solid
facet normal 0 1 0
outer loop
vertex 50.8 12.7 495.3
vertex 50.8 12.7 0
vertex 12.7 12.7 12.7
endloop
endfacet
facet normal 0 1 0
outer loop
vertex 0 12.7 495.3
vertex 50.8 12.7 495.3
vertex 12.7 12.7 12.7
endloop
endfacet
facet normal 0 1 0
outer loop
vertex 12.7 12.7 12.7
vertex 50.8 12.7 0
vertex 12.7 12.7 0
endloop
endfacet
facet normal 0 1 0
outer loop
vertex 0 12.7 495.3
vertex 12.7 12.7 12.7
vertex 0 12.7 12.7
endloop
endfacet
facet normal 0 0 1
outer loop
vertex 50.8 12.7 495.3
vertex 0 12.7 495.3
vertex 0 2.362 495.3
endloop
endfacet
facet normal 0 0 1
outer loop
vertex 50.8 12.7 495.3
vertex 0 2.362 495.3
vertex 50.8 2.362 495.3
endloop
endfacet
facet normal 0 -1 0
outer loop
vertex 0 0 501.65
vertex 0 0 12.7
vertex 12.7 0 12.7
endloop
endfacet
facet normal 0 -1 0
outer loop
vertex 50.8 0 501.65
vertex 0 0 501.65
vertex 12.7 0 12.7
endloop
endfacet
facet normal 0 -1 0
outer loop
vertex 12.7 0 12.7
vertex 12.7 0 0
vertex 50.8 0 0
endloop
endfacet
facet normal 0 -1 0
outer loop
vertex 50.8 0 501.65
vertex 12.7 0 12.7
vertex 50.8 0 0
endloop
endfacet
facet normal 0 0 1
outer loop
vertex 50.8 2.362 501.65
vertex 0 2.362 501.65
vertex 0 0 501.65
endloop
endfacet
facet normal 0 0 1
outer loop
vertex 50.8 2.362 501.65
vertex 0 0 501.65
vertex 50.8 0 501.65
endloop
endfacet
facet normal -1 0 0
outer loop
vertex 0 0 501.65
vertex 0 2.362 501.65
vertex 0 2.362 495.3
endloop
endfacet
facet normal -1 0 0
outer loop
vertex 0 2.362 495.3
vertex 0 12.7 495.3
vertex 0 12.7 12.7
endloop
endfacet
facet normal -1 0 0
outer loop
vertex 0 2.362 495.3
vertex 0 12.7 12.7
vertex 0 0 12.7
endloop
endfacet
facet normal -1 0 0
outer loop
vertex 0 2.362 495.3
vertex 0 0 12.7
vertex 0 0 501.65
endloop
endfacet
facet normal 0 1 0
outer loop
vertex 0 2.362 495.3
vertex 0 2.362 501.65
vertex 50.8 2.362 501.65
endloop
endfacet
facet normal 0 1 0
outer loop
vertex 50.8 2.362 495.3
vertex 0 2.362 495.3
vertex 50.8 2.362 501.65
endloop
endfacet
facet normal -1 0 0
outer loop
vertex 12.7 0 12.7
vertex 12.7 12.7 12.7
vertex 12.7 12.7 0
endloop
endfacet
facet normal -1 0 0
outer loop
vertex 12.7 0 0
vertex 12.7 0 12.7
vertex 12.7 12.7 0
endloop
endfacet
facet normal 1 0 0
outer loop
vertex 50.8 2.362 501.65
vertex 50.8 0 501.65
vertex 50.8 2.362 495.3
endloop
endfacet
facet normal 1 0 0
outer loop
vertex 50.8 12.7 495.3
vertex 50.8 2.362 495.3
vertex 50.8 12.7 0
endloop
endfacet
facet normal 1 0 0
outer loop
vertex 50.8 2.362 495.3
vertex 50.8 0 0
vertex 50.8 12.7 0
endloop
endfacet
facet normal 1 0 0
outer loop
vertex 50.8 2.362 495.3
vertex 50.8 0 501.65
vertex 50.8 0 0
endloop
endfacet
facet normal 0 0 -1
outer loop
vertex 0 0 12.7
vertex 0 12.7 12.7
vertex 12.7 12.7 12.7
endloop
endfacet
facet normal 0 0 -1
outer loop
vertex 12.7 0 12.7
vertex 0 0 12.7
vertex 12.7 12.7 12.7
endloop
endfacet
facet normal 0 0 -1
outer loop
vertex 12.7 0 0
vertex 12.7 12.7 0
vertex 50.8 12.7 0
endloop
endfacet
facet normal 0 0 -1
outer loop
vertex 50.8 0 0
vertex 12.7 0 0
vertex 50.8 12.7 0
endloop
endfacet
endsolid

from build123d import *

# Parameters (mm, degrees)
BOSS_EXTRUDE1_DEPTH = 501.65
SKETCH2_W           = 50.8
SKETCH2_H           = 6.35
CUT_EXTRUDE1_DEPTH  = 10.3378
SKETCH3_W           = 12.7
SKETCH3_H           = 12.7
CUT_EXTRUDE2_DEPTH  = 13.7


with BuildPart() as part:
    # Sketch1 → Boss-Extrude1 (new body)
    with BuildSketch(Plane.XY):
        Polygon((0, 12.7), (0, 6.35), (0, 0), (12.7, 0), (50.8, 0), (50.8, 12.7), align=None)
    extrude(amount=BOSS_EXTRUDE1_DEPTH)

    # Sketch2 → Cut-Extrude1 (cut)
    with BuildSketch(Plane.XZ.offset(-12.7)):
        with Locations((25.4, 498.475)):
            Rectangle(SKETCH2_W, SKETCH2_H)
    extrude(amount=CUT_EXTRUDE1_DEPTH, mode=Mode.SUBTRACT)

    # Sketch3 → Cut-Extrude2 (cut, through all)
    with BuildSketch(Plane(origin=(0, 12.7, 0), x_dir=(1, 0, 0), z_dir=(0, 1, 0))):
        with Locations((6.35, -6.35)):
            Rectangle(SKETCH3_W, SKETCH3_H)
    extrude(amount=-CUT_EXTRUDE2_DEPTH, mode=Mode.SUBTRACT)


solid = part.part
